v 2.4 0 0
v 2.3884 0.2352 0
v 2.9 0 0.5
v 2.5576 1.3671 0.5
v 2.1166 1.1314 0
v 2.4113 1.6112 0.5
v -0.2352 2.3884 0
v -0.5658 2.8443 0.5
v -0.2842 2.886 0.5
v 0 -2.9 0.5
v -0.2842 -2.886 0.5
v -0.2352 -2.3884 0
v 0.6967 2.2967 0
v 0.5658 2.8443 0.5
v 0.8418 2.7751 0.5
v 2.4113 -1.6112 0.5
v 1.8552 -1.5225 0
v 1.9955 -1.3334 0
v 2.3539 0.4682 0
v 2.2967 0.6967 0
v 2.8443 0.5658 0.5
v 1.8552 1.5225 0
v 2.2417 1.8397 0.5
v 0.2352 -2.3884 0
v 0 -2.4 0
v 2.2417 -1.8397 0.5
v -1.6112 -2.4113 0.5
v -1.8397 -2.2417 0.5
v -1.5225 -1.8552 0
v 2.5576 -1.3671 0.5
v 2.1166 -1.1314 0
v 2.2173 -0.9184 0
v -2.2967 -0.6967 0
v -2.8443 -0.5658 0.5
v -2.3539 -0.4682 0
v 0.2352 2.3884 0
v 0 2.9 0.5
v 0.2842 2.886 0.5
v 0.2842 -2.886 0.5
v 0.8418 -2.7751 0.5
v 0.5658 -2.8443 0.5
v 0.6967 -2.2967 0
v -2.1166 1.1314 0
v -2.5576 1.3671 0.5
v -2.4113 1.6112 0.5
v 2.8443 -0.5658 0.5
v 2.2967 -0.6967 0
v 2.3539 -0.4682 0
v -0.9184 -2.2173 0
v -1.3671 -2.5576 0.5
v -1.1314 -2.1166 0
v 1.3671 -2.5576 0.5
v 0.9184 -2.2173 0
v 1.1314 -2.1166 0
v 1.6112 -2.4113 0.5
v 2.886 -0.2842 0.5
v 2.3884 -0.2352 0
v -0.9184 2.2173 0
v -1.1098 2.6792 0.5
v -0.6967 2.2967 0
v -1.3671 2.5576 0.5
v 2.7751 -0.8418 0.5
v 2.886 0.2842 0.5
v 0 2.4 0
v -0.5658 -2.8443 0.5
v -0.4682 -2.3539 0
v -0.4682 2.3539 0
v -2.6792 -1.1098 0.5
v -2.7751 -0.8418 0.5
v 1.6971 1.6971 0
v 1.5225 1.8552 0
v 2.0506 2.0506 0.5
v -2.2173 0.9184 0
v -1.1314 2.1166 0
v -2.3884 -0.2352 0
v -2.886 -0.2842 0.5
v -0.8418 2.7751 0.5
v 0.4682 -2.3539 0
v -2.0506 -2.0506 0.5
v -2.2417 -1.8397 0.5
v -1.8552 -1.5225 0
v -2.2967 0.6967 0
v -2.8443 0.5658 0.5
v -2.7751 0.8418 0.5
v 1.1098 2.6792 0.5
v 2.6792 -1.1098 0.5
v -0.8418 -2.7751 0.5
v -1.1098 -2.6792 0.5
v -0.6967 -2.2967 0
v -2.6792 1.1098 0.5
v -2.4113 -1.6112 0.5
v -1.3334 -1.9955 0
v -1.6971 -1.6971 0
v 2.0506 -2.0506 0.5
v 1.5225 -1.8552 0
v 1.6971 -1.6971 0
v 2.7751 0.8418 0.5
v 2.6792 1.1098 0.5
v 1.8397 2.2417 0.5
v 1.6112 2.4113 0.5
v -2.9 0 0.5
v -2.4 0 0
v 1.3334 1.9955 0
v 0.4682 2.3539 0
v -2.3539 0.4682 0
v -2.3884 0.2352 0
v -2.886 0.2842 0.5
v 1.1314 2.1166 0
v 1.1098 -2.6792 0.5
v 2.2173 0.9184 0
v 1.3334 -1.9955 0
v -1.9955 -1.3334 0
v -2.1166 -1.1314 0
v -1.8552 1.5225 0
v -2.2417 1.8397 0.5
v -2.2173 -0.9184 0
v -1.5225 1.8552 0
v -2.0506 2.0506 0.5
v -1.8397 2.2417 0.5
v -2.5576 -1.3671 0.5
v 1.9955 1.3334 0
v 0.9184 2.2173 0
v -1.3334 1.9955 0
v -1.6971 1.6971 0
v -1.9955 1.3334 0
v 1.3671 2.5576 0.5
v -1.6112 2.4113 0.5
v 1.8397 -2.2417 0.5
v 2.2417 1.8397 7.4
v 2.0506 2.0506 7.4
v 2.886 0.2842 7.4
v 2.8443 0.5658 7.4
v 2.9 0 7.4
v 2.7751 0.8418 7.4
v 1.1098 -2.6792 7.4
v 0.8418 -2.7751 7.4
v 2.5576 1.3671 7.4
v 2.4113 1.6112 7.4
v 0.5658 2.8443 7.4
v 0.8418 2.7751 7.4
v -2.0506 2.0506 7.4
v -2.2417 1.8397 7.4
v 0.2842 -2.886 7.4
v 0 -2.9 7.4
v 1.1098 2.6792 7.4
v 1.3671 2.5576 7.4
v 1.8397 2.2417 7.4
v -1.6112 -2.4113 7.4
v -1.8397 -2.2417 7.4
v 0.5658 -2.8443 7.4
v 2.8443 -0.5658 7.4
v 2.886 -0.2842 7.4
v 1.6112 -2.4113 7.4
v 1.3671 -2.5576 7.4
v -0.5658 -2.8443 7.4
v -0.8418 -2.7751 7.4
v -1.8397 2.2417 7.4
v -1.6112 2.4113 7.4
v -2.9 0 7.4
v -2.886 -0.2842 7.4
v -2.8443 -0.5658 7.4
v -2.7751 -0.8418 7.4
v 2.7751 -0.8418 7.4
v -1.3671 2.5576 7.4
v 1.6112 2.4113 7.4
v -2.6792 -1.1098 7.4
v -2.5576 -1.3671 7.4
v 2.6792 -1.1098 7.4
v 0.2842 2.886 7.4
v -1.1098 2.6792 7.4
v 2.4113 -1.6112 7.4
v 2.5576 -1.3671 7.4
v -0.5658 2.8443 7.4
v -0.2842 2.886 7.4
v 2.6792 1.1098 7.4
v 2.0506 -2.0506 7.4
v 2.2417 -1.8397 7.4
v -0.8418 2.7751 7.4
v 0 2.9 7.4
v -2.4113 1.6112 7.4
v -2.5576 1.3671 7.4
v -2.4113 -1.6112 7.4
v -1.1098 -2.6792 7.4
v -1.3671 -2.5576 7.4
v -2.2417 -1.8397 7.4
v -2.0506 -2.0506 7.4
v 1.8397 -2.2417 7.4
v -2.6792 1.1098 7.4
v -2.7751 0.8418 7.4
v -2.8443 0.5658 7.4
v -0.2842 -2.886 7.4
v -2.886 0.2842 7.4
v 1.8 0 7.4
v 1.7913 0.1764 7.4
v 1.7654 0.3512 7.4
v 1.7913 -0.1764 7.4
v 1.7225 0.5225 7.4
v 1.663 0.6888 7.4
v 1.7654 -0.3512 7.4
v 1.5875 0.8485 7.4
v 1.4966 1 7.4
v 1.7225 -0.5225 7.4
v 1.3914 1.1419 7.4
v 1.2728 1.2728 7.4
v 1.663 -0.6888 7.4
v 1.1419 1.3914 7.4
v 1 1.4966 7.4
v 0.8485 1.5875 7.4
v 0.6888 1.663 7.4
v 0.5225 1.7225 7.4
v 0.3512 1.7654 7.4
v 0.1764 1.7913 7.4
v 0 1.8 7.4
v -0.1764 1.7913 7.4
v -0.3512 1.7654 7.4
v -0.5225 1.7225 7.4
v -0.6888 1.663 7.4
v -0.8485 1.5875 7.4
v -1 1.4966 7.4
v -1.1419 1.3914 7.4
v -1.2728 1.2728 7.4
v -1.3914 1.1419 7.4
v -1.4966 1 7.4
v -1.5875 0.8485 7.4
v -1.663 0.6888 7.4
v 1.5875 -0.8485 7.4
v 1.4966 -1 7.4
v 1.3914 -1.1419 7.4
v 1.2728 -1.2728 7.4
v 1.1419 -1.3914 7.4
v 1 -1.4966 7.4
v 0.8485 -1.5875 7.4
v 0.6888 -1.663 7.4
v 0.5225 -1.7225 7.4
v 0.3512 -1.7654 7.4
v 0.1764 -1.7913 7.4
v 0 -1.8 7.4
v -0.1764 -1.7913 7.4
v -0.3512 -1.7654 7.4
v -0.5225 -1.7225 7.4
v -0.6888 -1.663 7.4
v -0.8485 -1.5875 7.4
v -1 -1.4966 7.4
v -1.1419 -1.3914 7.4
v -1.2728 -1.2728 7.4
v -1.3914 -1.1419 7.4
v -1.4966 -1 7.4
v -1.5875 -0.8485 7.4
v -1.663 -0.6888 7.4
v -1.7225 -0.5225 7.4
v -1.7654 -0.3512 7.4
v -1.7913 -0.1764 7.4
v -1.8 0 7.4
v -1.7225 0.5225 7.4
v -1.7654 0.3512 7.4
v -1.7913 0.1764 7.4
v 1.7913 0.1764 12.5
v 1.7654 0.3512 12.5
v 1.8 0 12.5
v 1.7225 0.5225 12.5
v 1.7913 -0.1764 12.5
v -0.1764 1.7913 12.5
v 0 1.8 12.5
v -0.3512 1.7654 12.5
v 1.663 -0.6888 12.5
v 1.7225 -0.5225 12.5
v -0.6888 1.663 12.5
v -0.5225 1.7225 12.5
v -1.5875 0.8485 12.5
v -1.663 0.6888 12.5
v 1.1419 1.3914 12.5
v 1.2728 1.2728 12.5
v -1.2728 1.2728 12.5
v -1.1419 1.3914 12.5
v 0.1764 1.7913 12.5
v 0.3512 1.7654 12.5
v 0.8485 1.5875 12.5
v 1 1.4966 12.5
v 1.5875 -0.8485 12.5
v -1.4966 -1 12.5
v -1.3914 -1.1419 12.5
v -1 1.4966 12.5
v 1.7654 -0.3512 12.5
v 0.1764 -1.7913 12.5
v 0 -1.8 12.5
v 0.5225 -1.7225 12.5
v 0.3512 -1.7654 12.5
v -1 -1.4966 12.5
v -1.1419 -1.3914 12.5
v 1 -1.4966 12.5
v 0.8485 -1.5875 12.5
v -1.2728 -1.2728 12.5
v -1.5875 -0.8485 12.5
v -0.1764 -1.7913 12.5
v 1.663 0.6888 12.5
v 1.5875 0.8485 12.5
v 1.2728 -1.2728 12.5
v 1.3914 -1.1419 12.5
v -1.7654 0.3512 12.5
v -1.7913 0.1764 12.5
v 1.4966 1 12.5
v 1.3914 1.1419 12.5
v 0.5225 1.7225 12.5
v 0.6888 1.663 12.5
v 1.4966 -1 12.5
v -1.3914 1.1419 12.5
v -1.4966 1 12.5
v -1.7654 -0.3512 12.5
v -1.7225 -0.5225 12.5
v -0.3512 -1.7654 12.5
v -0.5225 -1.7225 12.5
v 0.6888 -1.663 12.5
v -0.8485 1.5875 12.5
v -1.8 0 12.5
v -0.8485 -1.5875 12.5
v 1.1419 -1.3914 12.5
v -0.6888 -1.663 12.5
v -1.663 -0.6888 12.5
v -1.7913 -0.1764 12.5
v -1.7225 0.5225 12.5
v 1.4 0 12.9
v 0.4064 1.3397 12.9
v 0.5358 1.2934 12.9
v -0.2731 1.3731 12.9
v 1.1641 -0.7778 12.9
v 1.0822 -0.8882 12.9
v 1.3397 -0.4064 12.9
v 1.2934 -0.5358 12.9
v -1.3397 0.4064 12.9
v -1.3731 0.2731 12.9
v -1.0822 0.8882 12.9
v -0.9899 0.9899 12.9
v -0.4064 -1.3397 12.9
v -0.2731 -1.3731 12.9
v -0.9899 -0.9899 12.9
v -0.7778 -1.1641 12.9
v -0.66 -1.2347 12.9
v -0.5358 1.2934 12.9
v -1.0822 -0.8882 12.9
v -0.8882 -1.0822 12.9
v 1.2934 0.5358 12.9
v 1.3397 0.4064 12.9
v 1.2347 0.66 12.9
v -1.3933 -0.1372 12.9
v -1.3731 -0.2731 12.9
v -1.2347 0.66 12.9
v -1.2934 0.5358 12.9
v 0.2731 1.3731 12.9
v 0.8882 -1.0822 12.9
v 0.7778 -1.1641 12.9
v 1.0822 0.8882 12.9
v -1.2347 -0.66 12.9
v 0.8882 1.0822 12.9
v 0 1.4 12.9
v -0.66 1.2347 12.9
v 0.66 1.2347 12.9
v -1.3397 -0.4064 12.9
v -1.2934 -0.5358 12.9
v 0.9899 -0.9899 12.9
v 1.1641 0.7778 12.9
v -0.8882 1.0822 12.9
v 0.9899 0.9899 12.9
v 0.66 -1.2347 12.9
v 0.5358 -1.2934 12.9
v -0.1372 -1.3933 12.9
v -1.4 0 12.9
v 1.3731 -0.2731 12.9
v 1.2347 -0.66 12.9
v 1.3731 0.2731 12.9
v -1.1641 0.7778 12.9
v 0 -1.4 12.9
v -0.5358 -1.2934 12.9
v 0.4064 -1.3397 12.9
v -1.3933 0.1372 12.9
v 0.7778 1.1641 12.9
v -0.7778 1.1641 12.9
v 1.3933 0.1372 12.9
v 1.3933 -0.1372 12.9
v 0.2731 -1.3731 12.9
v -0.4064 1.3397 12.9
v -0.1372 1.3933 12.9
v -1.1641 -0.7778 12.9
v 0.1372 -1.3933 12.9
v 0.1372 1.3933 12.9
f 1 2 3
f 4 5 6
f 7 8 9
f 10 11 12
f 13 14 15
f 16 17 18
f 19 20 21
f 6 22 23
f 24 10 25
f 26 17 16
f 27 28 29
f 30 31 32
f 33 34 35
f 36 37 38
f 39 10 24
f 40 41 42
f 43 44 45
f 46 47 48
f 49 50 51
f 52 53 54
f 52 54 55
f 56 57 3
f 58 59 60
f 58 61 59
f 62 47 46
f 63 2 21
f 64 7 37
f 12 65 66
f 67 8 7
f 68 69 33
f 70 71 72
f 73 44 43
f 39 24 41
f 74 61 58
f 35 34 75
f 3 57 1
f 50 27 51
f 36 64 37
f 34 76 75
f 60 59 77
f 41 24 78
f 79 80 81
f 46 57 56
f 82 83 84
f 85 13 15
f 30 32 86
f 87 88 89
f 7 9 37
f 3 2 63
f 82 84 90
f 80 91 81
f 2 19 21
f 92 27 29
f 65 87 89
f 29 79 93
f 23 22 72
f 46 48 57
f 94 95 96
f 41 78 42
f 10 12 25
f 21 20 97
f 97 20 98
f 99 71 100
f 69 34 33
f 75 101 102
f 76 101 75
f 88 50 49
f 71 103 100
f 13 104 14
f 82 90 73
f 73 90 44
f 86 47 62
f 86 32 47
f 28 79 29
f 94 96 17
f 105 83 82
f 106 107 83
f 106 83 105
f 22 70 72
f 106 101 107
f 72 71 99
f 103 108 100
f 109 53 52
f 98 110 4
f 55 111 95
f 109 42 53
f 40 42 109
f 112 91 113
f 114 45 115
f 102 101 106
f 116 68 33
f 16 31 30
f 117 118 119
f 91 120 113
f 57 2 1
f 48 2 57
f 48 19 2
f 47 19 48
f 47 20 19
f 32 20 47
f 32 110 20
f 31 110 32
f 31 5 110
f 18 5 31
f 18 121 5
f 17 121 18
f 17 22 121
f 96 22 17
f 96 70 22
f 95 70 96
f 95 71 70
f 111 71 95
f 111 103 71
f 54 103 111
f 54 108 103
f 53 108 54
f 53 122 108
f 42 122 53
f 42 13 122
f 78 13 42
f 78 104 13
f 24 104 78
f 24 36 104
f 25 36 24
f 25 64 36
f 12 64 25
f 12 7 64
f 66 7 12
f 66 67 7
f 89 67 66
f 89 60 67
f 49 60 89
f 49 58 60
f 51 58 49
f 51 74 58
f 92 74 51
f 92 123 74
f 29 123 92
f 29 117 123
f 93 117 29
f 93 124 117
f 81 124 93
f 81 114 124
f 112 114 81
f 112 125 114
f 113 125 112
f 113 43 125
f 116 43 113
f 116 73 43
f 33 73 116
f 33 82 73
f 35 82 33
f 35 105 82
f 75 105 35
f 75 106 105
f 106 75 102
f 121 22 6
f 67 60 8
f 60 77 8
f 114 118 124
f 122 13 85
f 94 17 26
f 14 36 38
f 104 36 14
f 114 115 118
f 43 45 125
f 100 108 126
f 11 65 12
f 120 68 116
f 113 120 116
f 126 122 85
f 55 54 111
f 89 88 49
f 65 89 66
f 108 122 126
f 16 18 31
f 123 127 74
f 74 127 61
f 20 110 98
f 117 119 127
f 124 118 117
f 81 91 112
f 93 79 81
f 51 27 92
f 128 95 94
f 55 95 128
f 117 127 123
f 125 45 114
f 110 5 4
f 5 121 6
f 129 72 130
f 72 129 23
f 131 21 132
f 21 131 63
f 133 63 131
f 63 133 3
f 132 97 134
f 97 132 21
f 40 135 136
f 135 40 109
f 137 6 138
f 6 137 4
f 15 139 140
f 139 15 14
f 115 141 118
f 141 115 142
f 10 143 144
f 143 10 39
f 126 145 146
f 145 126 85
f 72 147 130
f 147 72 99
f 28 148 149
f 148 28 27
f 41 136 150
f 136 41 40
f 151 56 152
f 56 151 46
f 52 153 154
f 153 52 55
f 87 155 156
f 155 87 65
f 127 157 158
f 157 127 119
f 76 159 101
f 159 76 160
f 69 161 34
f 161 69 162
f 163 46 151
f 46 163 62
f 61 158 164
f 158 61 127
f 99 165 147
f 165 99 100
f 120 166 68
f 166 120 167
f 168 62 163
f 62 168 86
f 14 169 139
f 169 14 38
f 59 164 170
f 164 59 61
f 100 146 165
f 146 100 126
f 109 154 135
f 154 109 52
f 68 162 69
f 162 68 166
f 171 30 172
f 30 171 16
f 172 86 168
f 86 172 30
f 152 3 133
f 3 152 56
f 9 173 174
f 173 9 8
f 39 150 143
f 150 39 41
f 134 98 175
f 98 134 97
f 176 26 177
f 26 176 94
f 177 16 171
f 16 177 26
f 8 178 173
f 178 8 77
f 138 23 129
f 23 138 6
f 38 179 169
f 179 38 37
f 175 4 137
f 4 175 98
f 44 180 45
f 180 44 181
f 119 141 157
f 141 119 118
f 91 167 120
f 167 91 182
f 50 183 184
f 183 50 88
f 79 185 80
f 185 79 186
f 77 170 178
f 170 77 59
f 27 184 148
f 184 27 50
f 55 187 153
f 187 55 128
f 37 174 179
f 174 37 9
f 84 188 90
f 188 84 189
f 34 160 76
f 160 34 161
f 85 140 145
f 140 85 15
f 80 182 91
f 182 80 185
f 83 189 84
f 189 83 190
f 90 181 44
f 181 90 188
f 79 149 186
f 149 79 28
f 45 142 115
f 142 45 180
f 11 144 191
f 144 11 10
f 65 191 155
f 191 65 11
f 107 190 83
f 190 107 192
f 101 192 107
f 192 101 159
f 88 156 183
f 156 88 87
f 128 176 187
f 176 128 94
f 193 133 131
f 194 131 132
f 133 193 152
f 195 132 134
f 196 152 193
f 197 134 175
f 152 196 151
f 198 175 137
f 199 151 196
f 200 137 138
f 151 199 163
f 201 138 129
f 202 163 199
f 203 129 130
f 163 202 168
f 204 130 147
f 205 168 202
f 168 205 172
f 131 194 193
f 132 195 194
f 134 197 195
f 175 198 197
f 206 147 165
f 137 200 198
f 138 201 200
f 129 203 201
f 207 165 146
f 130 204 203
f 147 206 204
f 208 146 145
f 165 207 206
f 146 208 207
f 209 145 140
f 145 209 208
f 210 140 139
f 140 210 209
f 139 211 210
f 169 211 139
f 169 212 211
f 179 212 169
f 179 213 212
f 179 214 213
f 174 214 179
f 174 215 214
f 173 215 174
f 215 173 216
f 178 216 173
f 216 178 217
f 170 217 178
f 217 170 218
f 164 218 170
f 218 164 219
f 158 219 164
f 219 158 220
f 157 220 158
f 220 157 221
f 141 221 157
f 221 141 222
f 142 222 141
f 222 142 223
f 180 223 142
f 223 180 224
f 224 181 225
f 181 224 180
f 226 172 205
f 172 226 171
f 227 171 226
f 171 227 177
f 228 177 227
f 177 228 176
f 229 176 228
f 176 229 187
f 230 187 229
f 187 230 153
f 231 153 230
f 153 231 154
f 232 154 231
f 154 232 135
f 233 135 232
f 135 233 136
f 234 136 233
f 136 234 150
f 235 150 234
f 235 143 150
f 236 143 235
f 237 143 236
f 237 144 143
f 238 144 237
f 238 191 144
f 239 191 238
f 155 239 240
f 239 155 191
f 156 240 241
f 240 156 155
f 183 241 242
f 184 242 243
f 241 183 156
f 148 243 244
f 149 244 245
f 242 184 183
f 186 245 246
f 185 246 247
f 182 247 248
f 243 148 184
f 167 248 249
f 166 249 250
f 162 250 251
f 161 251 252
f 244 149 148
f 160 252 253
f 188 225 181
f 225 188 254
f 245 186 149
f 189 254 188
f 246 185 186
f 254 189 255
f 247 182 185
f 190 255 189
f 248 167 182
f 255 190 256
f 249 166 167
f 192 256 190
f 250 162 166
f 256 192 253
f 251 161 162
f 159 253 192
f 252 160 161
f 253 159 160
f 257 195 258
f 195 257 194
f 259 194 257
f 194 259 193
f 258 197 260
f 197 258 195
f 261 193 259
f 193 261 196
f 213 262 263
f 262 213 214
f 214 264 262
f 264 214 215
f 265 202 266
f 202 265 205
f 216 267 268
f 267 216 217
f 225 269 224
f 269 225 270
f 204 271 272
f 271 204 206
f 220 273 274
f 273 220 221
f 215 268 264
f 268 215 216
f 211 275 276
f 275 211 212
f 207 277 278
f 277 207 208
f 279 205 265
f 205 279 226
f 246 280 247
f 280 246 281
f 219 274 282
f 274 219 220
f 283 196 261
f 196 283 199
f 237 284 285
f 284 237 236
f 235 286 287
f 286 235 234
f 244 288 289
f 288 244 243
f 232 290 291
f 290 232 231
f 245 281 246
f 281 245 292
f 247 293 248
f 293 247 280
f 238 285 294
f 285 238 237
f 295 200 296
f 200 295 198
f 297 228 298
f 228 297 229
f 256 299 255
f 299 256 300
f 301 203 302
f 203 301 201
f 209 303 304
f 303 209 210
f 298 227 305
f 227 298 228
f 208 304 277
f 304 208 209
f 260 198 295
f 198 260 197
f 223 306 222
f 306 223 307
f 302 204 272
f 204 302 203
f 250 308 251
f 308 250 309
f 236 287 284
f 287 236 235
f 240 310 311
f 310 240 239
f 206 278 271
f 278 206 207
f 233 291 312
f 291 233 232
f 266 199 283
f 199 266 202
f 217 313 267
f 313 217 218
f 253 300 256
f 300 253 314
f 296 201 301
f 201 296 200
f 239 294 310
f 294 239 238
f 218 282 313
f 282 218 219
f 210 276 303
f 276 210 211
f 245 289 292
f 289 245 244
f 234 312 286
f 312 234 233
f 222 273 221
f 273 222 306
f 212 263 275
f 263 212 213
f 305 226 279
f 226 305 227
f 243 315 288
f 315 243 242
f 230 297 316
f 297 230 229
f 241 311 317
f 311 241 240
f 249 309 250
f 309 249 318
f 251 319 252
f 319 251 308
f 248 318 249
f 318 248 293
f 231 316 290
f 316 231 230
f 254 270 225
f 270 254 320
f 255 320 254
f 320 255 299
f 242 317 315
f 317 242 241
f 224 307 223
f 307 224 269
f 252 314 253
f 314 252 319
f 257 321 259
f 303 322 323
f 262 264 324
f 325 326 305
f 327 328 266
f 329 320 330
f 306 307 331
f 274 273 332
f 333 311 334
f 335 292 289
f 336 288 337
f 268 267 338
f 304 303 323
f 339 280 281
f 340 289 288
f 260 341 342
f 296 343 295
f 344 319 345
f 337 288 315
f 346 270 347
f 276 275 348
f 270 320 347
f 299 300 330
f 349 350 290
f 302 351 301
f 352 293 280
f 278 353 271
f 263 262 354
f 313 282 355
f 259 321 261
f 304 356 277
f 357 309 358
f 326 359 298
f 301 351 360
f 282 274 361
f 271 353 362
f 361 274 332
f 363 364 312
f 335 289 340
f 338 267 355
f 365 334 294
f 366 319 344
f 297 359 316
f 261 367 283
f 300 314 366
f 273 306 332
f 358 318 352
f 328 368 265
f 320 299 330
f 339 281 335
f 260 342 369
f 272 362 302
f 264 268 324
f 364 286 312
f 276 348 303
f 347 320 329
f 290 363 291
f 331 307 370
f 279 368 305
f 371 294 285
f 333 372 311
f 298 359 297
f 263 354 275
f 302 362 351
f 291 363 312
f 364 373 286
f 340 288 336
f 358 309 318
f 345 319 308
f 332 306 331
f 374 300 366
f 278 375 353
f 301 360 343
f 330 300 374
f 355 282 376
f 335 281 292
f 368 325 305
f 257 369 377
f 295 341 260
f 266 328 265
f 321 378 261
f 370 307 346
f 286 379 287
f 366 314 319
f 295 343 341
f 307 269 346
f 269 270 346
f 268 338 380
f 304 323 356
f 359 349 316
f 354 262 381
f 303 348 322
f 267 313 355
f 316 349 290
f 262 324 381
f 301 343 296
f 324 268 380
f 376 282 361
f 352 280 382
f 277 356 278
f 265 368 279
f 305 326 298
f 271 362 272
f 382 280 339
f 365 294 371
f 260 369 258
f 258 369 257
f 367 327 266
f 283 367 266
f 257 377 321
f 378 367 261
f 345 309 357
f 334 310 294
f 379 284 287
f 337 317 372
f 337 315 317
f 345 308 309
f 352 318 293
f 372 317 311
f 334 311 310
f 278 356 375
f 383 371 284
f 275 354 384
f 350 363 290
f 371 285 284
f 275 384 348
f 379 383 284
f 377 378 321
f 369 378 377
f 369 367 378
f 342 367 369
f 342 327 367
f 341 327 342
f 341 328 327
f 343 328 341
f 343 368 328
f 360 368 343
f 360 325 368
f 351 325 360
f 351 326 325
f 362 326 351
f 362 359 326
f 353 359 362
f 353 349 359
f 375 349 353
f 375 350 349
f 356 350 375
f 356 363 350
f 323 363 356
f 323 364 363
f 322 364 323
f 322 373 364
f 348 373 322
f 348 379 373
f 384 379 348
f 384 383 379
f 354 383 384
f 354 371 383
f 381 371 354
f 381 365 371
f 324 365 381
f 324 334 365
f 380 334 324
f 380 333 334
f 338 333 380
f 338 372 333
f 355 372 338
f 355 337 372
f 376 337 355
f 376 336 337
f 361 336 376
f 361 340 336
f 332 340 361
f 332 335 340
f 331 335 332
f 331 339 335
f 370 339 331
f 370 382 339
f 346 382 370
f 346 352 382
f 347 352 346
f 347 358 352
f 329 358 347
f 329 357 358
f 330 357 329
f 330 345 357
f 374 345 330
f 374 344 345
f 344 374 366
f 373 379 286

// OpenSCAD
// =====================================
// Jigsaw Peg
// Replacement peg for a missing peg in a jigsaw item
// Photo/caliper readings: hole 3.78mm inside jaws, 6mm deep (reporter);
// existing peg 5.81mm across the head, standing 7.16-7.66mm above the piece
// Modeled head-top-down: prints flat on the bed, no supports
// =====================================

$fn = 64;

// ---- Parameters (mm) ----
hole_d = 3.8;        // hole diameter (caliper, inside jaws)
hole_depth = 6;      // hole depth (reporter)
seat_gap = 0.5;      // shank stops this far short of the hole bottom so the head seats
head_d = 5.8;        // head diameter (caliper, across the existing peg)
head_h = 7.4;        // peg height standing proud of the piece (7.16-7.66 measured)
head_chamfer = 0.5;  // 45-degree edge break on the head's top
clearance = 0.2;     // diametral fit clearance; slip fit, glue in
lead_in = 0.4;       // 45-degree insertion chamfer on the shank's free end

// ---- Derived ----
shank_d = hole_d - clearance;        // 3.6 at defaults
shank_len = hole_depth - seat_gap;   // 5.5 at defaults, never longer than the hole
head_top_d = head_d - 2 * head_chamfer;

assert(seat_gap >= 0, "seat_gap must not be negative or the shank is longer than the hole");
assert(shank_len > lead_in, "shank_len must exceed lead_in");
assert(head_top_d > 0, "head_chamfer too large for head_d");
assert(head_chamfer < head_h, "head_chamfer must be less than head_h");
assert(shank_d > 2 * lead_in, "shank_d must exceed 2 * lead_in");
assert(head_d > shank_d, "head_d must be larger than shank_d");

module jigsaw_peg() {
    // Head top face on the bed (z = 0), shank rising from it
    cylinder(d1 = head_top_d, d2 = head_d, h = head_chamfer);
    translate([0, 0, head_chamfer])
        cylinder(d = head_d, h = head_h - head_chamfer);
    translate([0, 0, head_h])
        cylinder(d = shank_d, h = shank_len - lead_in);
    translate([0, 0, head_h + shank_len - lead_in])
        cylinder(d1 = shank_d, d2 = shank_d - 2 * lead_in, h = lead_in);
}

jigsaw_peg();
